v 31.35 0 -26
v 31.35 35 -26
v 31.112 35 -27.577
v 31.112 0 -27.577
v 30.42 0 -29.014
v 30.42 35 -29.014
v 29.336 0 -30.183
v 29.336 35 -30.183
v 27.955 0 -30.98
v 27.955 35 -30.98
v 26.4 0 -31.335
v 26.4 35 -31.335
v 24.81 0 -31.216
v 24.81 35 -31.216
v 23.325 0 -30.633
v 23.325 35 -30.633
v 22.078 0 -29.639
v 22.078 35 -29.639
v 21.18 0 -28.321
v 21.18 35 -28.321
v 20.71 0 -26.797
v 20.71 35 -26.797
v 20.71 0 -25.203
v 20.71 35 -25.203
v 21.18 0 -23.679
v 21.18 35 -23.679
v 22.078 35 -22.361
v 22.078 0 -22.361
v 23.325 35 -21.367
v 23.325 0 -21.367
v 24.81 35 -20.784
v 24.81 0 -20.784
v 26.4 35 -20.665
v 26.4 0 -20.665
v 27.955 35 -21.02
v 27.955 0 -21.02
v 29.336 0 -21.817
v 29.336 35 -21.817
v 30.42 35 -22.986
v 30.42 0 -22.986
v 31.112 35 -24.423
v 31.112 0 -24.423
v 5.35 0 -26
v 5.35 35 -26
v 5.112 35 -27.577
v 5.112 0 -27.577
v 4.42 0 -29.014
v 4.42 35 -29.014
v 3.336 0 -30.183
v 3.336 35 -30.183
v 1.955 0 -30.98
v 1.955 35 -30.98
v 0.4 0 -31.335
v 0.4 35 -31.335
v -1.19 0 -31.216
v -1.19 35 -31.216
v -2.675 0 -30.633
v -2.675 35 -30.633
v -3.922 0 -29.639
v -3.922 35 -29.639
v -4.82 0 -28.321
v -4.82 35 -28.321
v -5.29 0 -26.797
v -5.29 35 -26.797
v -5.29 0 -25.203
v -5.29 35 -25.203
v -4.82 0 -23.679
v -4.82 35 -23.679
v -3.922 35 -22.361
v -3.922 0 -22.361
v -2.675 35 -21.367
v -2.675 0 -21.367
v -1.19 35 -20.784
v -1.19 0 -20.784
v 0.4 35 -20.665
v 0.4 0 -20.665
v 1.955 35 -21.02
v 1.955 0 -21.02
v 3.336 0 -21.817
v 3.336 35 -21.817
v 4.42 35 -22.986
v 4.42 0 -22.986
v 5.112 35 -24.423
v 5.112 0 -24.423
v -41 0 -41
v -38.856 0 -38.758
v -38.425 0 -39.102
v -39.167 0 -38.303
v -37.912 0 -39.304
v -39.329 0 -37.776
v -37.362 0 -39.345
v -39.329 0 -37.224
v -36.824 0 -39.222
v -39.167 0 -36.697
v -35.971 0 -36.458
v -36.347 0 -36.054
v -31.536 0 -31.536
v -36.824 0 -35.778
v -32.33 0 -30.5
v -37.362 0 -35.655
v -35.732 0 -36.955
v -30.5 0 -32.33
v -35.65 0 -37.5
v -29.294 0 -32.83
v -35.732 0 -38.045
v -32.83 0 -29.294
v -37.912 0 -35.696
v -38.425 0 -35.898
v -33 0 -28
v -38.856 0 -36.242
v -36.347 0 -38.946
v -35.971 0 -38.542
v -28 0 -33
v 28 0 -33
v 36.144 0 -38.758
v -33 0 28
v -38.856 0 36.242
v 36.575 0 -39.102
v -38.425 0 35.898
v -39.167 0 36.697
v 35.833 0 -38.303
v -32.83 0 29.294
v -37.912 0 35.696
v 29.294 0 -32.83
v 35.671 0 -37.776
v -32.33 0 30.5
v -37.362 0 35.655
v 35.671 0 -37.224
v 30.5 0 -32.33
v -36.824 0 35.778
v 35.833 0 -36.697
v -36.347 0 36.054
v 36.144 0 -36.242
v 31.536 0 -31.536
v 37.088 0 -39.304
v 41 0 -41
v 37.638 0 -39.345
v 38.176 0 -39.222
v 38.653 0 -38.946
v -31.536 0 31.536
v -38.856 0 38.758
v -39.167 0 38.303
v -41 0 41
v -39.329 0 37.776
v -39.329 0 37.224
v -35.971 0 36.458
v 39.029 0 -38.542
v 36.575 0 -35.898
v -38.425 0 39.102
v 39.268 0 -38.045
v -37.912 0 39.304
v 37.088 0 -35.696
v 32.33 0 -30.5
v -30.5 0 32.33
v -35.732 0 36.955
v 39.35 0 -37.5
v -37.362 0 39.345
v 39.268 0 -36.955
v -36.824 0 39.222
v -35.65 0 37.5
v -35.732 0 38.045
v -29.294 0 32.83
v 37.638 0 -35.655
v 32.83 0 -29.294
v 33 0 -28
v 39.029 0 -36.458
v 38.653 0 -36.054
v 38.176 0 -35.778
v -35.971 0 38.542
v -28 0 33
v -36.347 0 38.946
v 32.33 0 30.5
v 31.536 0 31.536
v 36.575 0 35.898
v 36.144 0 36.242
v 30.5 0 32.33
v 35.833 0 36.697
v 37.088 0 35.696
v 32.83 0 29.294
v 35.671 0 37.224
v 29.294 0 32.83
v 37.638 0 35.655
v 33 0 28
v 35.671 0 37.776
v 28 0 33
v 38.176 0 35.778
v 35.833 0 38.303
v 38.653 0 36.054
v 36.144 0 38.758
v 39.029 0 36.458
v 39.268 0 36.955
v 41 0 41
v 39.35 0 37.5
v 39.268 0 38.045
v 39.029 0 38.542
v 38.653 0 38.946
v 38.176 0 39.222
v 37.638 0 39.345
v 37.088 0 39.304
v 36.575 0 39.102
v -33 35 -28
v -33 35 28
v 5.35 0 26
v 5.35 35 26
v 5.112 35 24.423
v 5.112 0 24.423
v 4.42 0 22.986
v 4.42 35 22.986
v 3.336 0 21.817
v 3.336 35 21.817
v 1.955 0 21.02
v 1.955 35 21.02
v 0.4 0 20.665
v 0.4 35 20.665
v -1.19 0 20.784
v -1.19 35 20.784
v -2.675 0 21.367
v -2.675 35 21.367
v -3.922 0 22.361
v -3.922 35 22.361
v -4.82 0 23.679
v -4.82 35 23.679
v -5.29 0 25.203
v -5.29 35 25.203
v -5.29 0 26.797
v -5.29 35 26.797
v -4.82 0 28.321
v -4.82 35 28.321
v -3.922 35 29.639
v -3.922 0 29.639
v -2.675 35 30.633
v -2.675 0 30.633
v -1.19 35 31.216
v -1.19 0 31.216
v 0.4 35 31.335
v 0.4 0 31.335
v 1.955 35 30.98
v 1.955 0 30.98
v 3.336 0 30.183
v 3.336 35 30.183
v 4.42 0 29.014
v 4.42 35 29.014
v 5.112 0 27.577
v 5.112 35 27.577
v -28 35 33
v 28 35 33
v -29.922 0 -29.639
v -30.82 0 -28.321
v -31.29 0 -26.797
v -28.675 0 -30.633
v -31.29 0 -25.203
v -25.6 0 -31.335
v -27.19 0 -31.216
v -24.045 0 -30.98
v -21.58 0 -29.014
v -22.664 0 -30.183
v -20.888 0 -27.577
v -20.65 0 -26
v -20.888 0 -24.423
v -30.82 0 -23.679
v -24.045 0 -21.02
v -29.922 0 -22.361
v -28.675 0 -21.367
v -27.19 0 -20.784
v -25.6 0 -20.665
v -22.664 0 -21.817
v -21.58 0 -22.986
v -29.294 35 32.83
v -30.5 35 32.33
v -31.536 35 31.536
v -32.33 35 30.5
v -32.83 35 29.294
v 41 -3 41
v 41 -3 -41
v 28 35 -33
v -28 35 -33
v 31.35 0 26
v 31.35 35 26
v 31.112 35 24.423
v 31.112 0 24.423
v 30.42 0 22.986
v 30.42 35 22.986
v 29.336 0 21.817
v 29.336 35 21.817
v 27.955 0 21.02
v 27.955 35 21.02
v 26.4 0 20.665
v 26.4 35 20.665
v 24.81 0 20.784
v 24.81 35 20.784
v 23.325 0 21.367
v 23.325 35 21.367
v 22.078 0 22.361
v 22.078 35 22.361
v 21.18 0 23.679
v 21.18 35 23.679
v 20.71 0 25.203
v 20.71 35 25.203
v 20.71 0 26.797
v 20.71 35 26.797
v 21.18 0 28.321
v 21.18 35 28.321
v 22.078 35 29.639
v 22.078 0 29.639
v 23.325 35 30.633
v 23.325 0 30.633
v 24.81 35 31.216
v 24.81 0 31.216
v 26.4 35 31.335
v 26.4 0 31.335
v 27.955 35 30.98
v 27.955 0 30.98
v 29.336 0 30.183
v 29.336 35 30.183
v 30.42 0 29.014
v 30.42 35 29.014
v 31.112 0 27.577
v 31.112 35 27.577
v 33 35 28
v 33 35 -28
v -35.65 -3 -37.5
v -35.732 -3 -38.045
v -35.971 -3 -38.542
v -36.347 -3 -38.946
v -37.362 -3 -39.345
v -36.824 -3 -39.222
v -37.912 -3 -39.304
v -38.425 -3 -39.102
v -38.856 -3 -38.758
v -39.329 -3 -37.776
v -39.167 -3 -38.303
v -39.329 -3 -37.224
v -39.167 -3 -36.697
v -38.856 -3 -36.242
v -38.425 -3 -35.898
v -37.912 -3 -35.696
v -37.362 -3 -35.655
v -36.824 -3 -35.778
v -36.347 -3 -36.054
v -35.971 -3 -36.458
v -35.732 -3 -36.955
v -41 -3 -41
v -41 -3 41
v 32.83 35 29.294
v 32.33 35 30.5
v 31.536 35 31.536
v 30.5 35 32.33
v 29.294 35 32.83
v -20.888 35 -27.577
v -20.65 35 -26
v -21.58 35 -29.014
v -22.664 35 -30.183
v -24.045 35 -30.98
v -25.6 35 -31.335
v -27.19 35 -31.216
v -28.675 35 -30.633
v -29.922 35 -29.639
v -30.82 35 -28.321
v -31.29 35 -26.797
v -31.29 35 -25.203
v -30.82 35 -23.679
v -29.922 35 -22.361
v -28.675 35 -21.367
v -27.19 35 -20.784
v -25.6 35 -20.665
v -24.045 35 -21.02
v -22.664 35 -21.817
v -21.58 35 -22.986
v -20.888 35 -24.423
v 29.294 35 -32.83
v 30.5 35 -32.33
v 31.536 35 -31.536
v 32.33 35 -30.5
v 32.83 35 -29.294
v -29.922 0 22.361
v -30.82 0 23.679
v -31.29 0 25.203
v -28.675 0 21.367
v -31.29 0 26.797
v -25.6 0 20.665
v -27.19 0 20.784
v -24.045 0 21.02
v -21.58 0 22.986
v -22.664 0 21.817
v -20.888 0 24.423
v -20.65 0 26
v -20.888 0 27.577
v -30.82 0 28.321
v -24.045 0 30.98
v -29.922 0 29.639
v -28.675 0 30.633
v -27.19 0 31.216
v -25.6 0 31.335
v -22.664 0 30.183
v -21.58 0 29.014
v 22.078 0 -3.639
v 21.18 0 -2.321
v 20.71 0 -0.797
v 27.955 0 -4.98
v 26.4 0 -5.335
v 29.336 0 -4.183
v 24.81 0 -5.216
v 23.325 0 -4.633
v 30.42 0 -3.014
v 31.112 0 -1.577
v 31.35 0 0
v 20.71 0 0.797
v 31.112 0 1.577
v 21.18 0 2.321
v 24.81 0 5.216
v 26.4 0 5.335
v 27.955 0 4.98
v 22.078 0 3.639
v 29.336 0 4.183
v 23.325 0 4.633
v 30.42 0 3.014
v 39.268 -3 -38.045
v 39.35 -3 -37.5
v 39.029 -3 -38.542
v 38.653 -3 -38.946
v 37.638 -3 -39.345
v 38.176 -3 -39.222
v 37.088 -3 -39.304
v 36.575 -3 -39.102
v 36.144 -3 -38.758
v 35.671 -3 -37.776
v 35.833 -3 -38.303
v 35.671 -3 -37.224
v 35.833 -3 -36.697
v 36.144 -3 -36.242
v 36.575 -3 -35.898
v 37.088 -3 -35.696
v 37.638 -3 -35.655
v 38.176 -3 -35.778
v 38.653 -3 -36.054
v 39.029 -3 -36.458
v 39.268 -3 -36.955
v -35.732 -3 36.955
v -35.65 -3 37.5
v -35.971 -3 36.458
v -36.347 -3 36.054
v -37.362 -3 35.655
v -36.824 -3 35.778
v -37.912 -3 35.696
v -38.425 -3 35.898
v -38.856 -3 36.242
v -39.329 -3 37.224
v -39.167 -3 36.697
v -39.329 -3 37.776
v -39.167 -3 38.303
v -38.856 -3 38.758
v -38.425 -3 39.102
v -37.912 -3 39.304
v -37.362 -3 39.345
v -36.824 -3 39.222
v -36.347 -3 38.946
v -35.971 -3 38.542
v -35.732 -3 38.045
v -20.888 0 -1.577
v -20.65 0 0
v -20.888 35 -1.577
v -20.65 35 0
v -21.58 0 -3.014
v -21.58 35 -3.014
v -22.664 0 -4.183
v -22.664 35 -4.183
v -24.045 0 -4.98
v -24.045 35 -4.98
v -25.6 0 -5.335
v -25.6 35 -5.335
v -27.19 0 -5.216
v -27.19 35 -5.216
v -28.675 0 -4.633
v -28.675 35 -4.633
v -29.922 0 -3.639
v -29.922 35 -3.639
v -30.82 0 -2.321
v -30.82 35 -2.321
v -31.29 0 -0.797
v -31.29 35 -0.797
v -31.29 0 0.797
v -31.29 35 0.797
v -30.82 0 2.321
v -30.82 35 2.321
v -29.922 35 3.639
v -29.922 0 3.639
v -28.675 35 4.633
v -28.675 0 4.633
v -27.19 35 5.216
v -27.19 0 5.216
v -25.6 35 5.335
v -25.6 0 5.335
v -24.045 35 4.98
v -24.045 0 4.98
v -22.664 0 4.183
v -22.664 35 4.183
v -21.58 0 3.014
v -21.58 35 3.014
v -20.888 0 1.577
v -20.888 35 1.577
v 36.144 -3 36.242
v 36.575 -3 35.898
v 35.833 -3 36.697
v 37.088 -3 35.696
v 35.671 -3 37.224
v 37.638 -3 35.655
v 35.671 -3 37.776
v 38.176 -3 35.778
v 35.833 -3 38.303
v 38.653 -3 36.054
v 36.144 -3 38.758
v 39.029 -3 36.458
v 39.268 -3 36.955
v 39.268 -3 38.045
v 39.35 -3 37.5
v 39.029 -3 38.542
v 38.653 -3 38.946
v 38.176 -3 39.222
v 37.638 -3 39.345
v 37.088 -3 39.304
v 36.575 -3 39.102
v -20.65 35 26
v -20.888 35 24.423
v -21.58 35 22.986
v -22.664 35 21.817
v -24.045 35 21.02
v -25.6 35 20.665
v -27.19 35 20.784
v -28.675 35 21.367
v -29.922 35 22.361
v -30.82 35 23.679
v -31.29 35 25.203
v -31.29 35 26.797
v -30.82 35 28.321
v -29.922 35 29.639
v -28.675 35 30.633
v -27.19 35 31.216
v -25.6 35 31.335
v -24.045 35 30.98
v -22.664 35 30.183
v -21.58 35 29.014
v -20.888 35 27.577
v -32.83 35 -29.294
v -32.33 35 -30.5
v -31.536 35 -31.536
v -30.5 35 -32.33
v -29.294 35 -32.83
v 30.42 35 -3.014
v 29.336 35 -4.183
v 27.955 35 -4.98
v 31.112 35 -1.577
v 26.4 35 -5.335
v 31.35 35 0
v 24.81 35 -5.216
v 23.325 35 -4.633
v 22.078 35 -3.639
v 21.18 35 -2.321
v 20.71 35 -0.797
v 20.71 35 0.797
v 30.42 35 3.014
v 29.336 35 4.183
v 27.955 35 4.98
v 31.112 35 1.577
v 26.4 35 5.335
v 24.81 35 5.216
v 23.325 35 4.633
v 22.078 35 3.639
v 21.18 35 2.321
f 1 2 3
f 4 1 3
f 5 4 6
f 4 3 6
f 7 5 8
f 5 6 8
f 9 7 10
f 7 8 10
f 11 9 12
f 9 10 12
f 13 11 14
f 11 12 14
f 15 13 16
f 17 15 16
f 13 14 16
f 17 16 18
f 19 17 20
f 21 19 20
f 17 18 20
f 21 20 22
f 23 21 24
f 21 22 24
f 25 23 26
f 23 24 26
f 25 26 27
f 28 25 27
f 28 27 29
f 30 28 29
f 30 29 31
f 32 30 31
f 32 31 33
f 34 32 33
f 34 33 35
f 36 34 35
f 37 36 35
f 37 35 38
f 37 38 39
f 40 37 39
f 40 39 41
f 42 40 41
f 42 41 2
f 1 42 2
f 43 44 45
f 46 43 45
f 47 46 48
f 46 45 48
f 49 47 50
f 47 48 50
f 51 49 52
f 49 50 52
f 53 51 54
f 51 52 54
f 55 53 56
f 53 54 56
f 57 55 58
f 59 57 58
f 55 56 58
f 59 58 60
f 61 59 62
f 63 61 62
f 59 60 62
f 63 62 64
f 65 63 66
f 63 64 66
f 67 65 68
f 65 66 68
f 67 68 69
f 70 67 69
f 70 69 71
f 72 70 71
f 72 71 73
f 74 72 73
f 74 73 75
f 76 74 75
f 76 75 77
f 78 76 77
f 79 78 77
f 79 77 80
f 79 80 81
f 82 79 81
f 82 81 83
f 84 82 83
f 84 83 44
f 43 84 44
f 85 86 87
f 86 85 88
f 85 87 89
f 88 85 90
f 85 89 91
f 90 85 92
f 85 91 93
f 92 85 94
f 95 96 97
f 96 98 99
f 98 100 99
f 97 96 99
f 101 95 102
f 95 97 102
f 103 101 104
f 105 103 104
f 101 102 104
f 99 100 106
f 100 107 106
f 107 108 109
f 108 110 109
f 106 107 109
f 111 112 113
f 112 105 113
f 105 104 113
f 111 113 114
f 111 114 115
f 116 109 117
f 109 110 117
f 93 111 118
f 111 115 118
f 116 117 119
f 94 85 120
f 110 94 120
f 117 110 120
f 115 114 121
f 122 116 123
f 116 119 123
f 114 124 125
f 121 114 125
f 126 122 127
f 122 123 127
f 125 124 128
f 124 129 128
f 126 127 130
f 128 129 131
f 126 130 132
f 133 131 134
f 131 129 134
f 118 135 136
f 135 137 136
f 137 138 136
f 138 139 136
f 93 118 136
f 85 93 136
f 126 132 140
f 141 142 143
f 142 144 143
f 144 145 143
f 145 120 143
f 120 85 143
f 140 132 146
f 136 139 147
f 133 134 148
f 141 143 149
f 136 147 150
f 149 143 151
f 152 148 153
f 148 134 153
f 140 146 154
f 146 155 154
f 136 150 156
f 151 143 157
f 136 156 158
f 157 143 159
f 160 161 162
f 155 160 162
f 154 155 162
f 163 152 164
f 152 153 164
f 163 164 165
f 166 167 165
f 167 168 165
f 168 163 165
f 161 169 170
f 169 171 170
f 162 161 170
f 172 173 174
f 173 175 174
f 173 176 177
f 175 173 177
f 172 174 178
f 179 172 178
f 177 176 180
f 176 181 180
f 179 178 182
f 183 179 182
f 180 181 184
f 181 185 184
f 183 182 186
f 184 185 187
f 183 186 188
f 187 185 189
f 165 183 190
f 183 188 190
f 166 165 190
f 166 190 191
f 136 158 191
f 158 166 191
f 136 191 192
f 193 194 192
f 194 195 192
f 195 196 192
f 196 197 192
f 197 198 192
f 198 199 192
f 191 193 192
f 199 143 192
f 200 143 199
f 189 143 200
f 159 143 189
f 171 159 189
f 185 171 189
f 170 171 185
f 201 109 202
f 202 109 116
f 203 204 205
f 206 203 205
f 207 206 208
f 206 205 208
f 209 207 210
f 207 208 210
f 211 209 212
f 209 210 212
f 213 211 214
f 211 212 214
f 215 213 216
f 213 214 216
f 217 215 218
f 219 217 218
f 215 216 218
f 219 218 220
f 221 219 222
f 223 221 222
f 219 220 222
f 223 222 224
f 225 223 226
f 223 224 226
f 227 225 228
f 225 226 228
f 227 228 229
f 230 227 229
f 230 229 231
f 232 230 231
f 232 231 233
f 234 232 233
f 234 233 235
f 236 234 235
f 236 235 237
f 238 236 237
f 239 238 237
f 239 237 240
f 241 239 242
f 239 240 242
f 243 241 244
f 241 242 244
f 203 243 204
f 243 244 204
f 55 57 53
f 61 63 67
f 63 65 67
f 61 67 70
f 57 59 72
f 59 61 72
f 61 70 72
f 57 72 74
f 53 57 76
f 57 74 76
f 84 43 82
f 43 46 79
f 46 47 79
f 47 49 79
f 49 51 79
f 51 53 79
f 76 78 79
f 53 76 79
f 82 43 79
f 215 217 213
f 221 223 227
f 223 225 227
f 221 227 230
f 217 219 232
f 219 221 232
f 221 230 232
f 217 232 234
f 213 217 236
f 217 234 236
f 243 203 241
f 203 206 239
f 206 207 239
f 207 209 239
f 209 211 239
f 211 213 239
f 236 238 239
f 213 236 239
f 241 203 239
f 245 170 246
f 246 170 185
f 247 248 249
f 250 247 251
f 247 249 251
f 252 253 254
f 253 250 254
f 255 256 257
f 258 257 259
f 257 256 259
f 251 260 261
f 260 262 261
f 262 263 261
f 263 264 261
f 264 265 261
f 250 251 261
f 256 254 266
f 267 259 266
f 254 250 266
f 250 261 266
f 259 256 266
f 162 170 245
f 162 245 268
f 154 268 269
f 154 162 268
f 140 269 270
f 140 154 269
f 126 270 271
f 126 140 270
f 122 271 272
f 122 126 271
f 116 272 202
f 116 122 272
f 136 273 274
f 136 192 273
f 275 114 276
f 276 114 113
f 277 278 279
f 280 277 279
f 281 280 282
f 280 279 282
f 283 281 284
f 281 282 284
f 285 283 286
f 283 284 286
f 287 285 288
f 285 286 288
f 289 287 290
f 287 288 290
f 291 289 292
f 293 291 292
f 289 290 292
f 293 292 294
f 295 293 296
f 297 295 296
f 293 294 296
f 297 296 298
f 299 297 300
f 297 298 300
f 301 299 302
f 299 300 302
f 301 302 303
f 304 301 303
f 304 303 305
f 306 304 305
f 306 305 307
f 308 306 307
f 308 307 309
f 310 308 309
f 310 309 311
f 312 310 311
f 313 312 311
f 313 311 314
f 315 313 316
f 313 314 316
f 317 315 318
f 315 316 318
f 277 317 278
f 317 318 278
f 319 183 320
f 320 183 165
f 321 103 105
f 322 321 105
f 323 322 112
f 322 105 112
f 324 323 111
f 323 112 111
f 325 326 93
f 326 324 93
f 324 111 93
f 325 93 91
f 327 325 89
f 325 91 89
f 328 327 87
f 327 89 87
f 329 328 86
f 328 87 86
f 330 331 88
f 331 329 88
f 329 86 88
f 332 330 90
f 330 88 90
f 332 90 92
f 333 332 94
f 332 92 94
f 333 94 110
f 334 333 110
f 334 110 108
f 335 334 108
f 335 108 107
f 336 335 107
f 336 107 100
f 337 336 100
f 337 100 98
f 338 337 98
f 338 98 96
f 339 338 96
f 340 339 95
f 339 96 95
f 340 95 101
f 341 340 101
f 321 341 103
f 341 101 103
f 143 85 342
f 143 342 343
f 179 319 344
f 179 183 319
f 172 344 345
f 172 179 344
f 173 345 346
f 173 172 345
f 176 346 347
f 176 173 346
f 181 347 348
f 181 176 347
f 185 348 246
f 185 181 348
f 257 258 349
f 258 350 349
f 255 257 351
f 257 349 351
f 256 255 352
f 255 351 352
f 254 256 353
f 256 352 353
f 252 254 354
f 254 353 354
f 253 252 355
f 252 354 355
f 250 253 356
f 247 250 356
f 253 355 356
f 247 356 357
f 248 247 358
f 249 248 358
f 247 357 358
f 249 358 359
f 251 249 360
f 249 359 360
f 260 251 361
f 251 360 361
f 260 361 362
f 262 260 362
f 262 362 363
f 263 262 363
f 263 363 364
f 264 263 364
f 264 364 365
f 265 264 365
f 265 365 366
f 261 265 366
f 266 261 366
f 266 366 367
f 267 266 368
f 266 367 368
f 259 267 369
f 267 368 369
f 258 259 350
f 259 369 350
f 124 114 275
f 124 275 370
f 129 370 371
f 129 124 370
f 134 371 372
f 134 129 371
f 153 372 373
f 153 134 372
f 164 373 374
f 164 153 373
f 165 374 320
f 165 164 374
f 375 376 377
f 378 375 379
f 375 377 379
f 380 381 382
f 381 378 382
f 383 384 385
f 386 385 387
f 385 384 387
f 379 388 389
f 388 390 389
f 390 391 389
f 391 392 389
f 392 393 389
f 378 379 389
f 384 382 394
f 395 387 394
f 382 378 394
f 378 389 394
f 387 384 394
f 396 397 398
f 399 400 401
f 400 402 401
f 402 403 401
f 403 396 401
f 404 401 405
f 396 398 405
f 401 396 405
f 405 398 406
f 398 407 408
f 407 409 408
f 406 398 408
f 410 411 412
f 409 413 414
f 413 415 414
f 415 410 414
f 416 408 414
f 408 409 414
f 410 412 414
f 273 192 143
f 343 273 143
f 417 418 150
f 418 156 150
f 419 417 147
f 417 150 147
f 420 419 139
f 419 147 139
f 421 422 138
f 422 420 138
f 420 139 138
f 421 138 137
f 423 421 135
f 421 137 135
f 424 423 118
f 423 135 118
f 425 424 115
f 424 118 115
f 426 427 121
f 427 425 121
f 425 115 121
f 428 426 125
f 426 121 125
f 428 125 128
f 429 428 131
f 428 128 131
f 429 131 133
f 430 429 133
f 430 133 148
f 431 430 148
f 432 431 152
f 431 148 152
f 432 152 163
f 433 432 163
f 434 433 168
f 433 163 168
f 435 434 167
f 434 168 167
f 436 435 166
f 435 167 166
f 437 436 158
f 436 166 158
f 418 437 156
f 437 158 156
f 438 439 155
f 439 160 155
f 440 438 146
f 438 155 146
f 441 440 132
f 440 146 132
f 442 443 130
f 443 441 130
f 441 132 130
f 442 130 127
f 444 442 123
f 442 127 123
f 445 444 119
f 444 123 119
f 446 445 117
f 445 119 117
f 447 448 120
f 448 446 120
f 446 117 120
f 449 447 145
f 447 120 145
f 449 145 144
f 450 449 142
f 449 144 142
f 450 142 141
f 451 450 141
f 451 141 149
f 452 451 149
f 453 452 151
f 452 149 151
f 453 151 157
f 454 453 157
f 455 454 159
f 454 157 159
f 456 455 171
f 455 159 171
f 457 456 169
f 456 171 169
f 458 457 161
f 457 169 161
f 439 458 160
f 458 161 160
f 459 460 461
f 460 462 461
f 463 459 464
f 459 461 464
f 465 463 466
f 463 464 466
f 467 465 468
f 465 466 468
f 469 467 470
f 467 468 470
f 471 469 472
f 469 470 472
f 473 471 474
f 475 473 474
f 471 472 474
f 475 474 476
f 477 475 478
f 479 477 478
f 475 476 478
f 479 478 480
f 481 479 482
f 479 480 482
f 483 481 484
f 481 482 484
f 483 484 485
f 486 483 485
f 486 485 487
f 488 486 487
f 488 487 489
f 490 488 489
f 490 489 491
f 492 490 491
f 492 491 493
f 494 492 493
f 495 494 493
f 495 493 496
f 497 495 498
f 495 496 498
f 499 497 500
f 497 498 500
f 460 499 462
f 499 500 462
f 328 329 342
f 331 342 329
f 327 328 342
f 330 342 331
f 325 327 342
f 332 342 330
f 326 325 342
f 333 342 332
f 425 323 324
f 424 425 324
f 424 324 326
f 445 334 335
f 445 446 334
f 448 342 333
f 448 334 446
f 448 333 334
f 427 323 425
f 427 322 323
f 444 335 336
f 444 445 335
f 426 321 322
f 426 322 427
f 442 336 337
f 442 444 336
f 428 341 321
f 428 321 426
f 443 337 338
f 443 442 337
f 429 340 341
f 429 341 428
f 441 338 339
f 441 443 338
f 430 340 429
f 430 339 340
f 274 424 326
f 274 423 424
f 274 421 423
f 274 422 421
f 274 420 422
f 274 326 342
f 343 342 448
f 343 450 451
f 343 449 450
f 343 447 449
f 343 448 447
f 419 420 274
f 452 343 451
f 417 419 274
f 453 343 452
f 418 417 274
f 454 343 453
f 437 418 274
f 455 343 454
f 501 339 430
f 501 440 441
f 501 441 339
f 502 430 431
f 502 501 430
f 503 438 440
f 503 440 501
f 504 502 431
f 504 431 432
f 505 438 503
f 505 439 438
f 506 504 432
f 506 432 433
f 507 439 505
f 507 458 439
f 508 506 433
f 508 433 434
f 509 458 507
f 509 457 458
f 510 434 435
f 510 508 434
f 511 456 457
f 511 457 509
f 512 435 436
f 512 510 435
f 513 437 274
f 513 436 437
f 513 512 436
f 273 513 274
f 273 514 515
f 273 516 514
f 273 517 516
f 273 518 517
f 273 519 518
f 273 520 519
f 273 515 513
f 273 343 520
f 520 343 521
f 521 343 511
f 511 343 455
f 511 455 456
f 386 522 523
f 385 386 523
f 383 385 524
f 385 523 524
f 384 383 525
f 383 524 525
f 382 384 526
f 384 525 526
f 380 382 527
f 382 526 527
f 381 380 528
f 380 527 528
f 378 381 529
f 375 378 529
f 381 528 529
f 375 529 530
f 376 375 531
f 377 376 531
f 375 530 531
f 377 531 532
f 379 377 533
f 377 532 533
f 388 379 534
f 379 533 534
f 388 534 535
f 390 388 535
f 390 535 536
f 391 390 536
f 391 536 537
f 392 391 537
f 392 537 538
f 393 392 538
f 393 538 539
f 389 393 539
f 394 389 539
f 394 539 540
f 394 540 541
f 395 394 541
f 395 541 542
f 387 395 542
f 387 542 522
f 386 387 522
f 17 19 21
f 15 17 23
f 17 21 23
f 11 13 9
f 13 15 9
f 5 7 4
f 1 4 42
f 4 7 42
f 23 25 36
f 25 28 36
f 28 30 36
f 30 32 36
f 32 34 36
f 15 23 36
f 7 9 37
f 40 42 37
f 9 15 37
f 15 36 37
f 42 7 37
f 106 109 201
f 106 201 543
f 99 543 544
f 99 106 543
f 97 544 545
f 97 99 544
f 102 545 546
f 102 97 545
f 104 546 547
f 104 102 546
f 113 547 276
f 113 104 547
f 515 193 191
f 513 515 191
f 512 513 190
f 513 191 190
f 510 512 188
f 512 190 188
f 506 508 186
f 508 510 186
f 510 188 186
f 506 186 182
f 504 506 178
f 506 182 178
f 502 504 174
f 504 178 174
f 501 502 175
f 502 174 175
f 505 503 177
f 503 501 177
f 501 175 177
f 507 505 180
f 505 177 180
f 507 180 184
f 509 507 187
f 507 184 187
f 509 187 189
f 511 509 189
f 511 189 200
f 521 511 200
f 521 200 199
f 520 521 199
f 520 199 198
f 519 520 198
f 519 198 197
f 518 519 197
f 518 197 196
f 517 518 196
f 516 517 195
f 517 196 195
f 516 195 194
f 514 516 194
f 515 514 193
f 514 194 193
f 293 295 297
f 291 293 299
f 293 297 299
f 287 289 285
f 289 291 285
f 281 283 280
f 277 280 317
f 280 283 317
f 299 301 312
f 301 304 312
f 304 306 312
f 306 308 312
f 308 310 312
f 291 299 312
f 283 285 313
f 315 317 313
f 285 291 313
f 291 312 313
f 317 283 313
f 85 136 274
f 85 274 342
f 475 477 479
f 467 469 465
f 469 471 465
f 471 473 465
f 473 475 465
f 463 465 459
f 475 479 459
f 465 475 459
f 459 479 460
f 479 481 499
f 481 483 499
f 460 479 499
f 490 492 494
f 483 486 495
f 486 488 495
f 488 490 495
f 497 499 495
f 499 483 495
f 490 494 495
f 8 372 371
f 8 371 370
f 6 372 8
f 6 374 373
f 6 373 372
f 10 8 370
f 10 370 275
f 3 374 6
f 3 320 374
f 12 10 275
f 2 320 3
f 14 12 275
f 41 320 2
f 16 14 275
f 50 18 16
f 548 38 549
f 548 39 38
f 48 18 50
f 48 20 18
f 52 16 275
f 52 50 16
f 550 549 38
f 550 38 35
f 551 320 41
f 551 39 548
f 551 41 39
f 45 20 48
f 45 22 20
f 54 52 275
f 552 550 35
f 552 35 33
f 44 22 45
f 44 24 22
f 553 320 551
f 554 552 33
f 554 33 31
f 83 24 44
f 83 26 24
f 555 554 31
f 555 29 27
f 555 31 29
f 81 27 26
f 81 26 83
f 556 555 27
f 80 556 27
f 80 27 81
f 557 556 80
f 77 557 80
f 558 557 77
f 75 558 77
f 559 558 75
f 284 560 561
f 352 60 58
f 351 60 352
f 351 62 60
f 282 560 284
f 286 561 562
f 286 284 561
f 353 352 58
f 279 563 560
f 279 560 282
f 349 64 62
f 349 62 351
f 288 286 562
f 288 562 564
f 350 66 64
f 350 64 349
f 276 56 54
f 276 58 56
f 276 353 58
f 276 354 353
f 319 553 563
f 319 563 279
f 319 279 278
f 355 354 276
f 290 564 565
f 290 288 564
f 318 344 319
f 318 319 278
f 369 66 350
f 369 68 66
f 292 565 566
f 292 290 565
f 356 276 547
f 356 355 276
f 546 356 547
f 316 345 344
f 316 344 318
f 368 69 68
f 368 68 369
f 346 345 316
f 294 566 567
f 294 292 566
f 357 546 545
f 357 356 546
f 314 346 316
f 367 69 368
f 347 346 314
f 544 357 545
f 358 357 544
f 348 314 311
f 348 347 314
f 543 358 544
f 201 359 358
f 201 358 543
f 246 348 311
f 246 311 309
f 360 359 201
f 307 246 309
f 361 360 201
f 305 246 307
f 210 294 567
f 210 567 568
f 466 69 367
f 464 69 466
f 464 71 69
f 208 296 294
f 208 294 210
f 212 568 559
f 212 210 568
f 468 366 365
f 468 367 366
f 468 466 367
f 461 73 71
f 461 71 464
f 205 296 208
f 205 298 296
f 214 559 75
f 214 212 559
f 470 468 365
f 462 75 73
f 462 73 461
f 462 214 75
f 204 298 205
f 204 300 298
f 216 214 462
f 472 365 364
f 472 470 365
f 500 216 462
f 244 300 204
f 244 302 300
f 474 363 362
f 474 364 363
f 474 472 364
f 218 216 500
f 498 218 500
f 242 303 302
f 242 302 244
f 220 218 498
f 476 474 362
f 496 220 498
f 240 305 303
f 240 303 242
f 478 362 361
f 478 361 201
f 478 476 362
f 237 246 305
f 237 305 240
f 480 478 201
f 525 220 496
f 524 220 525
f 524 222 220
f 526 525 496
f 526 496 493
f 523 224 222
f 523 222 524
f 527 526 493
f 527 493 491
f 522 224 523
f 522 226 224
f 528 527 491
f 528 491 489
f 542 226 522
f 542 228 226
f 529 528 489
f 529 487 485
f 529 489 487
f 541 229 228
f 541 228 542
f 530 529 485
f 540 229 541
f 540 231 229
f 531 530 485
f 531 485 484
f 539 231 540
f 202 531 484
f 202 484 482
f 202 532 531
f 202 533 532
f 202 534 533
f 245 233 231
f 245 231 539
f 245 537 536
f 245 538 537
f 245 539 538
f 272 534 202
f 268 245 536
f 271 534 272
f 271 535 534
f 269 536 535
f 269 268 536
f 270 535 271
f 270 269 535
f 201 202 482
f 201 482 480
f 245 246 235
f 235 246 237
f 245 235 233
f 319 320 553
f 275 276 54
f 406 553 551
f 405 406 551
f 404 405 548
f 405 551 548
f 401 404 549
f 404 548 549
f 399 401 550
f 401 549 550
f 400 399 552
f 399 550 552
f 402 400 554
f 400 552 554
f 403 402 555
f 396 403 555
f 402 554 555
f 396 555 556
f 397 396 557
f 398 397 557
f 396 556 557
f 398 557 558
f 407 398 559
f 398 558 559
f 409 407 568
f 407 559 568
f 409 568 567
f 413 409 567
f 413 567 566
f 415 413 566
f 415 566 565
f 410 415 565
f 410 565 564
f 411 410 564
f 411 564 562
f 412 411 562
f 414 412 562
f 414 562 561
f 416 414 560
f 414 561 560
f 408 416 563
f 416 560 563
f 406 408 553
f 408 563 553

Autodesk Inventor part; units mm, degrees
ref_plane "YZ Plane" through (0, 0, 0) normal (1, 0, 0) x (0, 1, 0)
ref_plane "XZ Plane" through (0, 0, 0) normal (0, 1, 0) x (-1, 0, 0)
ref_plane "XY Plane" through (0, 0, 0) normal (0, 0, 1) x (1, 0, 0)
sketch "Sketch1" plane through (0, 0, 0) normal (0, 1, 0) x (-1, 0, 0)
  line L0 (28, 33) -> (-28, 33)
  line L1 (-33, 28) -> (-33, -28)
  line L2 (-28, -33) -> (28, -33)
  line L3 (33, -28) -> (33, 28)
  line L4 (33, 33) -> (-33, -33) construction
  line L5 (-33, 33) -> (33, -33) construction
  arc A0 (28, -33) -> (33, -28) centre (28, -28) ccw
  arc A1 (33, 28) -> (28, 33) centre (28, 28) ccw
  arc A2 (-28, 33) -> (-33, 28) centre (-28, 28) ccw
  arc A3 (-33, -28) -> (-28, -33) centre (-28, -28) ccw
  point P0 (0, 0)
  dimension "d0" = 66
  dimension "d1" = 66
  dimension "d4" = 5
extrude "Extrusion1" add sketch "Sketch1" along normal blind 35
sketch "Sketch2" plane through (0, 35, 0) normal (0, 1, 0) x (1, 0, 0)
  line L0 (0, 0) -> (-10, 0)
  line L1 (0, 0) -> (0, -10)
  circle A0 centre (26, 26) radius 5.35
  circle A1 centre (0, 26) radius 5.35
  circle A2 centre (-26, 26) radius 5.35
  circle A3 centre (26, 0) radius 5.35
  circle A4 centre (0, 0) radius 5.35
  circle A5 centre (-26, 0) radius 5.35
  circle A6 centre (26, -26) radius 5.35
  circle A7 centre (0, -26) radius 5.35
  circle A8 centre (-26, -26) radius 5.35
  dimension "d8" = 10
  dimension "d9" = 10
  dimension "d10" = 10.7
  dimension "d11" = 26
  dimension "d12" = 26
  dimension "d15" = 26
  dimension "d18" = 26
extrude "Extrusion2" cut sketch "Sketch2" against normal blind 35 contours A0 | A1 | A2 | A3 | A5 | A6 | A7 | A8
sketch "Sketch4" plane through (0, 0, 0) normal (0, -1, 0) x (1, 0, 0)
  line L0 (37.5, 37.5) -> (-37.5, -37.5) construction
  line L1 (-37.5, 37.5) -> (37.5, -37.5) construction
  line L2 (-41, -38) -> (-41, 38)
  line L3 (41, -41) -> (-41, 41) construction
  line L4 (-41, -41) -> (41, 41) construction
  circle A0 centre (-37.5, 37.5) radius 1.85
  line L5 (38, 41) -> (-38, 41)
  line L6 (-38, -41) -> (38, -41)
  line L7 (41, -38) -> (41, 38)
  line L8 (41, 41) -> (-41, -41) construction
  line L9 (-41, 41) -> (41, -41) construction
  circle A1 centre (-37.5, -37.5) radius 1.85
  circle A2 centre (37.5, 37.5) radius 1.85
  circle A3 centre (37.5, -37.5) radius 1.85
  line L10 (-41, -38) -> (-41, -41)
  line L11 (-38, -41) -> (-41, -41)
  line L12 (-41, 38) -> (-41, 41)
  line L13 (-38, 41) -> (-41, 41)
  line L14 (38, 41) -> (41, 41)
  line L15 (41, 38) -> (41, 41)
  line L16 (41, -38) -> (41, -41)
  line L17 (41, -41) -> (38, -41)
  point P0 (0, 0)
  dimension "d28" = 75
  dimension "d29" = 75
  dimension "d31" = 82
  dimension "d56" = 3.7
  dimension "d68" = 75
  dimension "d71" = 75
extrude "Extrusion4" add sketch "Sketch4" along normal blind 3
thread "Thread5" size "M3.5x0.6" class "6H" standard "ANSI Metric M Profile" length 5.5
thread "Thread6" size "M3.5x0.6" class "6H" standard "ANSI Metric M Profile" length 5.5
thread "Thread7" size "M3.5x0.6" class "6H" standard "ANSI Metric M Profile" length 5.5
thread "Thread8" size "M3.5x0.6" class "6H" standard "ANSI Metric M Profile" length 5.5
properties part number "Aluminium Container 0805" material "Aluminum 6061"
